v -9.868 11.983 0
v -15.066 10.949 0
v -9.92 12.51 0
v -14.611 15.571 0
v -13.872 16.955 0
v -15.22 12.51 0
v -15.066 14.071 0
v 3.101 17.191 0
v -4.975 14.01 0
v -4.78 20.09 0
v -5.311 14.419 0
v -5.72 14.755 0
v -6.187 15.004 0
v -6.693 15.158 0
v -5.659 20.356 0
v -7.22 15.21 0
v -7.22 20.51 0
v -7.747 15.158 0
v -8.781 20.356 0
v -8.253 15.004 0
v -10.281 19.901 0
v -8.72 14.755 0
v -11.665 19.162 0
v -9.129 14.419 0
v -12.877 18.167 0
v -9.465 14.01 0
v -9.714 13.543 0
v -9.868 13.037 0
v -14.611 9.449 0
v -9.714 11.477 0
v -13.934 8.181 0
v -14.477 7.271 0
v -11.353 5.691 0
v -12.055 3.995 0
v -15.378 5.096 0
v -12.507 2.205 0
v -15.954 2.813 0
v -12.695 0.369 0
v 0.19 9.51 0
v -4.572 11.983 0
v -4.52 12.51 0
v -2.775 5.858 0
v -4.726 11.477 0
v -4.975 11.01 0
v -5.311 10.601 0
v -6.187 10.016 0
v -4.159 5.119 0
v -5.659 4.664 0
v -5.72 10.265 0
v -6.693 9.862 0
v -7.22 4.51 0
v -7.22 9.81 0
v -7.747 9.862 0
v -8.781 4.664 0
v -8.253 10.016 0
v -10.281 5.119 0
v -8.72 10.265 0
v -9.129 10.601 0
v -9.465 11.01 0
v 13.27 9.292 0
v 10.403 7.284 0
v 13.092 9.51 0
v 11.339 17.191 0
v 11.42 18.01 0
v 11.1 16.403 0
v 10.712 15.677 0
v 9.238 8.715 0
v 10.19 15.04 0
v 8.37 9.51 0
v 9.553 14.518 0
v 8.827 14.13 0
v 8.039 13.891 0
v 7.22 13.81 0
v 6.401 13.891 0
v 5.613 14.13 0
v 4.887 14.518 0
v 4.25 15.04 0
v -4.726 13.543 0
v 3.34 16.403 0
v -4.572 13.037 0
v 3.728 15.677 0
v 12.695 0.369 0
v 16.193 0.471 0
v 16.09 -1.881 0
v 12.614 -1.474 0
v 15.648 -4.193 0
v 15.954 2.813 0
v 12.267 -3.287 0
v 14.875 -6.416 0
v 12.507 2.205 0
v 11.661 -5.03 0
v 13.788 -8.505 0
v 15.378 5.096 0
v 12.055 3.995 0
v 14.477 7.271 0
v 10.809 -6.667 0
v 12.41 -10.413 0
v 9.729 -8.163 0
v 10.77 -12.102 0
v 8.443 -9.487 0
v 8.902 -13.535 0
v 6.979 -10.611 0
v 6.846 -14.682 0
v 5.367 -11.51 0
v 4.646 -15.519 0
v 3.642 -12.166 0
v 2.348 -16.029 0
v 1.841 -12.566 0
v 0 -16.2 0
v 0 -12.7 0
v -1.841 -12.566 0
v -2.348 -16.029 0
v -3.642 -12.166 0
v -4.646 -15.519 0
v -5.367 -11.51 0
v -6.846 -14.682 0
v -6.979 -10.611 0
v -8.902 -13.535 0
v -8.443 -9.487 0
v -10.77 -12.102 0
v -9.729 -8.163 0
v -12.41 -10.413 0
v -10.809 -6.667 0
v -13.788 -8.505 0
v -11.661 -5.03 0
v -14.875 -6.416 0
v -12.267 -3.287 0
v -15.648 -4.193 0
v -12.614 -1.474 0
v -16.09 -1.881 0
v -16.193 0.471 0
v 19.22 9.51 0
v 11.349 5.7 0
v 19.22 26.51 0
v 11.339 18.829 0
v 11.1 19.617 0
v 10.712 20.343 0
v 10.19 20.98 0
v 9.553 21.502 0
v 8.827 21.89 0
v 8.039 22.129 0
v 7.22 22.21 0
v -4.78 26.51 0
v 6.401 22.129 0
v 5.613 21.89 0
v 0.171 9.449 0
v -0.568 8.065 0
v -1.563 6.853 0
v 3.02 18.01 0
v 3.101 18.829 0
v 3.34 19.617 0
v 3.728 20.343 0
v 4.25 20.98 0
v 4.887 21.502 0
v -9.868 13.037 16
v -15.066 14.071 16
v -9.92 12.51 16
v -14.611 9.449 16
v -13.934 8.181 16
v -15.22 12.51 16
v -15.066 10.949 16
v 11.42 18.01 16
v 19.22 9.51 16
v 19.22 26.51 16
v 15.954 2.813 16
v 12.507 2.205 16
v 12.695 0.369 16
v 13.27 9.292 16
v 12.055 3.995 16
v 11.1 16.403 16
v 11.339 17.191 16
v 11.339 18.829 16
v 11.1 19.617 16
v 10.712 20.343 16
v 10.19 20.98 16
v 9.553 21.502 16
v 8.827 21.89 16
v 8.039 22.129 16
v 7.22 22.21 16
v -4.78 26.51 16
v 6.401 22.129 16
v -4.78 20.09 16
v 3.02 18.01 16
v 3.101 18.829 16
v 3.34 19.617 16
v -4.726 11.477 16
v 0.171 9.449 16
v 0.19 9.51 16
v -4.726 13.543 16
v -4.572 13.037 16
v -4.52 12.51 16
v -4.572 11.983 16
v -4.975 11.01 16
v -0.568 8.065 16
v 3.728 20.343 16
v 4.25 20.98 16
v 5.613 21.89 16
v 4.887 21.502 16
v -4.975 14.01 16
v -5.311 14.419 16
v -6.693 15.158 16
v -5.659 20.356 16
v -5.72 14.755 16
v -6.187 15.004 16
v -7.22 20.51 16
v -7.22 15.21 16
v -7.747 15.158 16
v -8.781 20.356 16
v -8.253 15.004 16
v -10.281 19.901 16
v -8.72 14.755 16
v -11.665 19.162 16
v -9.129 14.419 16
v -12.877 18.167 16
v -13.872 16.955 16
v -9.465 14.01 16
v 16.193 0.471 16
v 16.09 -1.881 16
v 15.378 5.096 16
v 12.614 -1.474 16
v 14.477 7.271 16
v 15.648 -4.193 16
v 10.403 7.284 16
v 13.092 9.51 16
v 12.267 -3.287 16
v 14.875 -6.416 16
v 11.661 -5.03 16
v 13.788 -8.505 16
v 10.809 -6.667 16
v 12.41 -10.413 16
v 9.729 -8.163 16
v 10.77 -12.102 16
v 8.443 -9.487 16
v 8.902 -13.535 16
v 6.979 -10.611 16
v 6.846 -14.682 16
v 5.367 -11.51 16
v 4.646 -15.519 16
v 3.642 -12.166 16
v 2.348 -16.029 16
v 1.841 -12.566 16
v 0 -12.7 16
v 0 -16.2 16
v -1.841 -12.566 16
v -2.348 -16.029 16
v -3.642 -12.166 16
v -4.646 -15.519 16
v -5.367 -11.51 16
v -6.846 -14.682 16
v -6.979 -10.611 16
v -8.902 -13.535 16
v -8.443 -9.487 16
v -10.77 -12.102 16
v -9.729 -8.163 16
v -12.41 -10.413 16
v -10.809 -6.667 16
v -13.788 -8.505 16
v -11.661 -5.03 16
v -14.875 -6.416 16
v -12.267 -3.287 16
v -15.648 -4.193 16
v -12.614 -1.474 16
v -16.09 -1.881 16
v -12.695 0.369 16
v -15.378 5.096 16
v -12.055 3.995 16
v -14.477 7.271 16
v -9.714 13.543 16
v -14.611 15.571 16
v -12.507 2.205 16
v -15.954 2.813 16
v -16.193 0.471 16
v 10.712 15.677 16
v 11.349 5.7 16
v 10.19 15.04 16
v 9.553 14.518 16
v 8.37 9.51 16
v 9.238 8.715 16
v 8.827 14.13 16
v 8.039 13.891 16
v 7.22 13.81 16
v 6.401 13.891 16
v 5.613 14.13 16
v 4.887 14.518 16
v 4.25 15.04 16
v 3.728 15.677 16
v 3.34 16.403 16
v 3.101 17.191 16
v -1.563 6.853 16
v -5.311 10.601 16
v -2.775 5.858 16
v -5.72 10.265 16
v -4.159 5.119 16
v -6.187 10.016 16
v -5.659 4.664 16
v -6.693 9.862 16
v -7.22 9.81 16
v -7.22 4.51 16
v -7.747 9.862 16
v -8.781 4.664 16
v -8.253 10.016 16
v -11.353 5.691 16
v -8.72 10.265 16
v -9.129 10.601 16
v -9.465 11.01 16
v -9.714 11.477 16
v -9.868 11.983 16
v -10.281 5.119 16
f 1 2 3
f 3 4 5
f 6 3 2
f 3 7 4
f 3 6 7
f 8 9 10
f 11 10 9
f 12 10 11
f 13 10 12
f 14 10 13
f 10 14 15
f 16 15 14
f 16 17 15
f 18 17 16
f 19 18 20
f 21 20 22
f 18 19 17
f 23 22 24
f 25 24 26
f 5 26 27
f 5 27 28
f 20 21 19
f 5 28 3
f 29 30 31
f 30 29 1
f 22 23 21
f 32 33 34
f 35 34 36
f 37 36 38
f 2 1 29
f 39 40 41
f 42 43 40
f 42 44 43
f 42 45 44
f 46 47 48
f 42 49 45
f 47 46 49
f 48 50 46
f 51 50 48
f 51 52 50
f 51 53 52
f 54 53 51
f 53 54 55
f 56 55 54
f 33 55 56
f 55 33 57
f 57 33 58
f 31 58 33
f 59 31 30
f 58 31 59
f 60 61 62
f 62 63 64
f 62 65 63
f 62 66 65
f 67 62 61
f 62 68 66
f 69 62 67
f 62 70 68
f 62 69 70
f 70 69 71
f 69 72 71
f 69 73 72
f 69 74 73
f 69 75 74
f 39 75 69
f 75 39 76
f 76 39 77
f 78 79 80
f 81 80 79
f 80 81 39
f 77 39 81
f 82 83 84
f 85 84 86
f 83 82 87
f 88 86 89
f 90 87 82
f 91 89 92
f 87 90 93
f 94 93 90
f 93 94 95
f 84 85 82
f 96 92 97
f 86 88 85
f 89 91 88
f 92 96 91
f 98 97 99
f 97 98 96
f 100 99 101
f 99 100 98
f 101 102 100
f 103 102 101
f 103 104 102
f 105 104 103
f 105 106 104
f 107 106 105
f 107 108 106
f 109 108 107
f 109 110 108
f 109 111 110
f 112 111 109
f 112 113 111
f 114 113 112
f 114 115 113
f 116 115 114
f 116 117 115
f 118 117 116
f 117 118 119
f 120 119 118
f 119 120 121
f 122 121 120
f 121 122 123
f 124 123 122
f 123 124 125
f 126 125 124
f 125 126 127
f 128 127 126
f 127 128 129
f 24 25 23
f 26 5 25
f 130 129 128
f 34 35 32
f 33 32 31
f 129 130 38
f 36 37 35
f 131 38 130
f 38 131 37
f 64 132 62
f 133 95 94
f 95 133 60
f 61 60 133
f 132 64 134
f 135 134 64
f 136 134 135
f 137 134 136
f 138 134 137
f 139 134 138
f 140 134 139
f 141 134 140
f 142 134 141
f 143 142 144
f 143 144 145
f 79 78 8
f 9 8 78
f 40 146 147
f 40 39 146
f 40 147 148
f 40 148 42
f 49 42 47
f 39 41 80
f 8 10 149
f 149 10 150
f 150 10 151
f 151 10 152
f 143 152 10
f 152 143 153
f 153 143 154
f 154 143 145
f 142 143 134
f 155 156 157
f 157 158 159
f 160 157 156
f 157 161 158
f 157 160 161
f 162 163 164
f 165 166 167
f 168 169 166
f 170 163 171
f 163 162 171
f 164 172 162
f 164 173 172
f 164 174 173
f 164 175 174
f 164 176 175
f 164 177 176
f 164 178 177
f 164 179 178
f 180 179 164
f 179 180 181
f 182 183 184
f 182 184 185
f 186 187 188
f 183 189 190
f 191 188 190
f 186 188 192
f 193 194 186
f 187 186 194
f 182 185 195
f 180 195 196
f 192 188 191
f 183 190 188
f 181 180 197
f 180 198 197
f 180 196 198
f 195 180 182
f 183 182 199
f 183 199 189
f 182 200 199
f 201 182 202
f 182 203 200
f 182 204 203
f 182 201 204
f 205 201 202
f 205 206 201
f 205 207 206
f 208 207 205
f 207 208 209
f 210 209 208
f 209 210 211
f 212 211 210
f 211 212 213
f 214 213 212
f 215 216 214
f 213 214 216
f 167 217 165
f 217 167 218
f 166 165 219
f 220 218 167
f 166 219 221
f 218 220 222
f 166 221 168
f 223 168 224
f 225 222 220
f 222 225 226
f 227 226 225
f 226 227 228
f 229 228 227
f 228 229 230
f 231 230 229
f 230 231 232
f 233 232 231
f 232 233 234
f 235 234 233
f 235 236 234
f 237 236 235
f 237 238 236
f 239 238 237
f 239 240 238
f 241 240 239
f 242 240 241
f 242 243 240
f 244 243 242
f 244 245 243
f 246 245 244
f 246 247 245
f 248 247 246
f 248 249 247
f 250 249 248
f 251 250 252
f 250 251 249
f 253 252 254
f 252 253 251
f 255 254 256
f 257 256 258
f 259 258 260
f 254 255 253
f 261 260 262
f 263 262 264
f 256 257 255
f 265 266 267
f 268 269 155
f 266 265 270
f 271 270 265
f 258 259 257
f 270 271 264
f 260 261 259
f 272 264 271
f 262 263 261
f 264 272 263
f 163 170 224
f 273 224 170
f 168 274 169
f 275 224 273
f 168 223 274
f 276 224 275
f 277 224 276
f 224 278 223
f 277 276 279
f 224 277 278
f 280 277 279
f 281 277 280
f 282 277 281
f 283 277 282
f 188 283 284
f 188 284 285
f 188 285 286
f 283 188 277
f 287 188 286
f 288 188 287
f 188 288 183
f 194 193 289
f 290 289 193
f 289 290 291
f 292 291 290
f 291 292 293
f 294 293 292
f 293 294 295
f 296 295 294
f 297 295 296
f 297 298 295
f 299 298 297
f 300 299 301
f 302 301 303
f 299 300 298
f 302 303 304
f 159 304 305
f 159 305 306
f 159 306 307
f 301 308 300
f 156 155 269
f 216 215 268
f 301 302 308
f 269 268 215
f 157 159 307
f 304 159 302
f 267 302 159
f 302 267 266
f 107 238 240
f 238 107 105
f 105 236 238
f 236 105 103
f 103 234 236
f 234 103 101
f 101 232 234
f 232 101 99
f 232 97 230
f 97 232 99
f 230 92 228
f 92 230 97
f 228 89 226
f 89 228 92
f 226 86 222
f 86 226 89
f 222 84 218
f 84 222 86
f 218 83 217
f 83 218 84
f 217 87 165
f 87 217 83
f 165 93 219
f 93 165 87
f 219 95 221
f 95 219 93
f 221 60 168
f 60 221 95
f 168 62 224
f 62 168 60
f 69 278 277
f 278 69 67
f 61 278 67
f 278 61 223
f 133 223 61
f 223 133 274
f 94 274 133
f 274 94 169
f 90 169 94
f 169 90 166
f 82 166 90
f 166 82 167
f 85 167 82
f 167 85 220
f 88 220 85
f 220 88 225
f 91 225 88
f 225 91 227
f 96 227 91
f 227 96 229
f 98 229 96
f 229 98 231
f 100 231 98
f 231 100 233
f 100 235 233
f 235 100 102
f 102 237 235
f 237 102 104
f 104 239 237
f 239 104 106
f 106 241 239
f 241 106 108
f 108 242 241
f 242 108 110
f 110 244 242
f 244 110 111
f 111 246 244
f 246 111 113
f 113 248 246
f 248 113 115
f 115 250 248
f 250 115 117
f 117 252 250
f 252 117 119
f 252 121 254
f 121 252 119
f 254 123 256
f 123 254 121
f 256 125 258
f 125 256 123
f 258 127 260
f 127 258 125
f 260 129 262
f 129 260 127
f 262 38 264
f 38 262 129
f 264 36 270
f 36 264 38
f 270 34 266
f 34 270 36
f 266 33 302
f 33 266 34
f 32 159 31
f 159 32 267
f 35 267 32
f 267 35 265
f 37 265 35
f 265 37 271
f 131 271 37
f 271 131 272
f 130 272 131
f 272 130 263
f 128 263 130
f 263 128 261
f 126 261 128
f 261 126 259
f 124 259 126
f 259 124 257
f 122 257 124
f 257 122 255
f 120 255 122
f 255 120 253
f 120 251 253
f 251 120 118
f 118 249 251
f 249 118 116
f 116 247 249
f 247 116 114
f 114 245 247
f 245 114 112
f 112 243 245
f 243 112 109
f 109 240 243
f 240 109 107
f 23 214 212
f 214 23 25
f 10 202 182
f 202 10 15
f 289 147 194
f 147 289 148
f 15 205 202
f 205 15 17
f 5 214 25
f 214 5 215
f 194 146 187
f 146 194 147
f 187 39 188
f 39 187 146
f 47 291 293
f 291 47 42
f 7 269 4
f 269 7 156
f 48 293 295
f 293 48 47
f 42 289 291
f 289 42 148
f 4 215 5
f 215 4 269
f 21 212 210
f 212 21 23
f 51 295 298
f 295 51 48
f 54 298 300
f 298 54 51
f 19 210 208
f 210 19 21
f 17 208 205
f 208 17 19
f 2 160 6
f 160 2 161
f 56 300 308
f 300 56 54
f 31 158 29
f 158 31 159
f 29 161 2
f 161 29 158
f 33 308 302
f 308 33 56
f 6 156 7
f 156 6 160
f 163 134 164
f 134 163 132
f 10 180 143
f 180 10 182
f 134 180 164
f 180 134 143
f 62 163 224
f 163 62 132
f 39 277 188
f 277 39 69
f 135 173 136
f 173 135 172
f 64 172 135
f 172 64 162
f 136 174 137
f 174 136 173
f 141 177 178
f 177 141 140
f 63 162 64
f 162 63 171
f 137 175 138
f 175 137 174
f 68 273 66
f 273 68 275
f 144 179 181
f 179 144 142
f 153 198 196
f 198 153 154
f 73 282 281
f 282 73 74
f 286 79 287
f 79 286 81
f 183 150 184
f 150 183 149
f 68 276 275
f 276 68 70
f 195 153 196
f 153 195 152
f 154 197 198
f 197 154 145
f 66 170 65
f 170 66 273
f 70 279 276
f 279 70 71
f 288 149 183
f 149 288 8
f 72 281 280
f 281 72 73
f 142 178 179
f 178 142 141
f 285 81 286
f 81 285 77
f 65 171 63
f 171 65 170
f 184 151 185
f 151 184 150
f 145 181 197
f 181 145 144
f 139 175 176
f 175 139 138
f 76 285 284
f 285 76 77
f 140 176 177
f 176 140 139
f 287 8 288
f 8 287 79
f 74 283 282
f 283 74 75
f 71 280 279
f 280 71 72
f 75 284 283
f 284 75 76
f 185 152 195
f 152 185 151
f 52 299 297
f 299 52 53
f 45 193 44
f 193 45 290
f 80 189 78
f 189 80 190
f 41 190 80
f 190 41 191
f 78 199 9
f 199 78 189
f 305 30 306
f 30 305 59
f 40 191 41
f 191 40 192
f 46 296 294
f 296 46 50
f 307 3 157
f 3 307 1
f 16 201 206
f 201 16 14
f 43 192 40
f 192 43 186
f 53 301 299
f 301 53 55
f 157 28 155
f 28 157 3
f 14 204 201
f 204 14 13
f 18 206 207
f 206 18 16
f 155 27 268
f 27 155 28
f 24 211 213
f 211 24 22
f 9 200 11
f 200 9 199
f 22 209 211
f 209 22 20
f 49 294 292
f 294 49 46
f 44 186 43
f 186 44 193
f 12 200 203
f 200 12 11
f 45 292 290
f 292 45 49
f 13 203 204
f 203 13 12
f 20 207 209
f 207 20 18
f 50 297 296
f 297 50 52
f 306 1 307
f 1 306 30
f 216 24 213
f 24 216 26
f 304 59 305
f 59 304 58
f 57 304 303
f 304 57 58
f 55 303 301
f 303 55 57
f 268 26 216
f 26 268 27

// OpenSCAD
$fn = 32;

// ----------------------------------------------------------------------
// Pipe clamp: 32.4 mm ring, 3.5 mm wall, 16 mm wide
// ----------------------------------------------------------------------

// --- parameters (mm) ---
outer_r = 16.2;           // clamp outside radius
inner_r = 12.7;           // pipe bore radius
band = 3.5;               // band thickness
clamp_w = 16;             // clamp width
opening = 60;             // opening angle between the ends
lug_w = 24;               // lug width
lug_len = 17;             // lug length
bolt_d = 8.4;             // bolt hole
knuckle_d = 16;           // hinge knuckle diameter
pin_d = 5.4;              // hinge pin hole

clamp_profile = [[-8.1, 14.03], [-10.048, 12.708], [-11.783, 11.117], [-13.27, 9.292], [-14.477, 7.271], [-15.378, 5.096], [-15.954, 2.813], [-16.193, 0.471], [-16.09, -1.881], [-15.648, -4.193], [-14.875, -6.416], [-13.788, -8.505], [-12.41, -10.413], [-10.77, -12.102], [-8.902, -13.535], [-6.846, -14.682], [-4.646, -15.519], [-2.348, -16.029], [0, -16.2], [2.348, -16.029], [4.646, -15.519], [6.846, -14.682], [8.902, -13.535], [10.77, -12.102], [12.41, -10.413], [13.788, -8.505], [14.875, -6.416], [15.648, -4.193], [16.09, -1.881], [16.193, 0.471], [15.954, 2.813], [15.378, 5.096], [14.477, 7.271], [13.27, 9.292], [11.783, 11.117], [10.048, 12.708], [8.1, 14.03], [6.35, 10.999], [7.877, 9.962], [9.238, 8.715], [10.403, 7.284], [11.349, 5.7], [12.055, 3.995], [12.507, 2.205], [12.695, 0.369], [12.614, -1.474], [12.267, -3.287], [11.661, -5.03], [10.809, -6.667], [9.729, -8.163], [8.443, -9.487], [6.979, -10.611], [5.367, -11.51], [3.642, -12.166], [1.841, -12.566], [0, -12.7], [-1.841, -12.566], [-3.642, -12.166], [-5.367, -11.51], [-6.979, -10.611], [-8.443, -9.487], [-9.729, -8.163], [-10.809, -6.667], [-11.661, -5.03], [-12.267, -3.287], [-12.614, -1.474], [-12.695, 0.369], [-12.507, 2.205], [-12.055, 3.995], [-11.349, 5.7], [-10.403, 7.284], [-9.238, 8.715], [-7.877, 9.962], [-6.35, 10.999]];

difference() {
  union() {
    linear_extrude(height = clamp_w) polygon(clamp_profile);
    /* hinge knuckle, sunk 2 mm into the band end */
    translate([-7.22, 12.51, 0]) cylinder(h = clamp_w, d = knuckle_d);
    /* bolt lug on the other end */
    translate([-4.78, 9.51, 0]) cube([lug_w, 17, clamp_w]);
  }
  translate([7.22, 18.01, -2.5]) cylinder(h = clamp_w + 5, d = bolt_d);
  translate([-7.22, 12.51, -2.5]) cylinder(h = clamp_w + 5, d = pin_d);
}
